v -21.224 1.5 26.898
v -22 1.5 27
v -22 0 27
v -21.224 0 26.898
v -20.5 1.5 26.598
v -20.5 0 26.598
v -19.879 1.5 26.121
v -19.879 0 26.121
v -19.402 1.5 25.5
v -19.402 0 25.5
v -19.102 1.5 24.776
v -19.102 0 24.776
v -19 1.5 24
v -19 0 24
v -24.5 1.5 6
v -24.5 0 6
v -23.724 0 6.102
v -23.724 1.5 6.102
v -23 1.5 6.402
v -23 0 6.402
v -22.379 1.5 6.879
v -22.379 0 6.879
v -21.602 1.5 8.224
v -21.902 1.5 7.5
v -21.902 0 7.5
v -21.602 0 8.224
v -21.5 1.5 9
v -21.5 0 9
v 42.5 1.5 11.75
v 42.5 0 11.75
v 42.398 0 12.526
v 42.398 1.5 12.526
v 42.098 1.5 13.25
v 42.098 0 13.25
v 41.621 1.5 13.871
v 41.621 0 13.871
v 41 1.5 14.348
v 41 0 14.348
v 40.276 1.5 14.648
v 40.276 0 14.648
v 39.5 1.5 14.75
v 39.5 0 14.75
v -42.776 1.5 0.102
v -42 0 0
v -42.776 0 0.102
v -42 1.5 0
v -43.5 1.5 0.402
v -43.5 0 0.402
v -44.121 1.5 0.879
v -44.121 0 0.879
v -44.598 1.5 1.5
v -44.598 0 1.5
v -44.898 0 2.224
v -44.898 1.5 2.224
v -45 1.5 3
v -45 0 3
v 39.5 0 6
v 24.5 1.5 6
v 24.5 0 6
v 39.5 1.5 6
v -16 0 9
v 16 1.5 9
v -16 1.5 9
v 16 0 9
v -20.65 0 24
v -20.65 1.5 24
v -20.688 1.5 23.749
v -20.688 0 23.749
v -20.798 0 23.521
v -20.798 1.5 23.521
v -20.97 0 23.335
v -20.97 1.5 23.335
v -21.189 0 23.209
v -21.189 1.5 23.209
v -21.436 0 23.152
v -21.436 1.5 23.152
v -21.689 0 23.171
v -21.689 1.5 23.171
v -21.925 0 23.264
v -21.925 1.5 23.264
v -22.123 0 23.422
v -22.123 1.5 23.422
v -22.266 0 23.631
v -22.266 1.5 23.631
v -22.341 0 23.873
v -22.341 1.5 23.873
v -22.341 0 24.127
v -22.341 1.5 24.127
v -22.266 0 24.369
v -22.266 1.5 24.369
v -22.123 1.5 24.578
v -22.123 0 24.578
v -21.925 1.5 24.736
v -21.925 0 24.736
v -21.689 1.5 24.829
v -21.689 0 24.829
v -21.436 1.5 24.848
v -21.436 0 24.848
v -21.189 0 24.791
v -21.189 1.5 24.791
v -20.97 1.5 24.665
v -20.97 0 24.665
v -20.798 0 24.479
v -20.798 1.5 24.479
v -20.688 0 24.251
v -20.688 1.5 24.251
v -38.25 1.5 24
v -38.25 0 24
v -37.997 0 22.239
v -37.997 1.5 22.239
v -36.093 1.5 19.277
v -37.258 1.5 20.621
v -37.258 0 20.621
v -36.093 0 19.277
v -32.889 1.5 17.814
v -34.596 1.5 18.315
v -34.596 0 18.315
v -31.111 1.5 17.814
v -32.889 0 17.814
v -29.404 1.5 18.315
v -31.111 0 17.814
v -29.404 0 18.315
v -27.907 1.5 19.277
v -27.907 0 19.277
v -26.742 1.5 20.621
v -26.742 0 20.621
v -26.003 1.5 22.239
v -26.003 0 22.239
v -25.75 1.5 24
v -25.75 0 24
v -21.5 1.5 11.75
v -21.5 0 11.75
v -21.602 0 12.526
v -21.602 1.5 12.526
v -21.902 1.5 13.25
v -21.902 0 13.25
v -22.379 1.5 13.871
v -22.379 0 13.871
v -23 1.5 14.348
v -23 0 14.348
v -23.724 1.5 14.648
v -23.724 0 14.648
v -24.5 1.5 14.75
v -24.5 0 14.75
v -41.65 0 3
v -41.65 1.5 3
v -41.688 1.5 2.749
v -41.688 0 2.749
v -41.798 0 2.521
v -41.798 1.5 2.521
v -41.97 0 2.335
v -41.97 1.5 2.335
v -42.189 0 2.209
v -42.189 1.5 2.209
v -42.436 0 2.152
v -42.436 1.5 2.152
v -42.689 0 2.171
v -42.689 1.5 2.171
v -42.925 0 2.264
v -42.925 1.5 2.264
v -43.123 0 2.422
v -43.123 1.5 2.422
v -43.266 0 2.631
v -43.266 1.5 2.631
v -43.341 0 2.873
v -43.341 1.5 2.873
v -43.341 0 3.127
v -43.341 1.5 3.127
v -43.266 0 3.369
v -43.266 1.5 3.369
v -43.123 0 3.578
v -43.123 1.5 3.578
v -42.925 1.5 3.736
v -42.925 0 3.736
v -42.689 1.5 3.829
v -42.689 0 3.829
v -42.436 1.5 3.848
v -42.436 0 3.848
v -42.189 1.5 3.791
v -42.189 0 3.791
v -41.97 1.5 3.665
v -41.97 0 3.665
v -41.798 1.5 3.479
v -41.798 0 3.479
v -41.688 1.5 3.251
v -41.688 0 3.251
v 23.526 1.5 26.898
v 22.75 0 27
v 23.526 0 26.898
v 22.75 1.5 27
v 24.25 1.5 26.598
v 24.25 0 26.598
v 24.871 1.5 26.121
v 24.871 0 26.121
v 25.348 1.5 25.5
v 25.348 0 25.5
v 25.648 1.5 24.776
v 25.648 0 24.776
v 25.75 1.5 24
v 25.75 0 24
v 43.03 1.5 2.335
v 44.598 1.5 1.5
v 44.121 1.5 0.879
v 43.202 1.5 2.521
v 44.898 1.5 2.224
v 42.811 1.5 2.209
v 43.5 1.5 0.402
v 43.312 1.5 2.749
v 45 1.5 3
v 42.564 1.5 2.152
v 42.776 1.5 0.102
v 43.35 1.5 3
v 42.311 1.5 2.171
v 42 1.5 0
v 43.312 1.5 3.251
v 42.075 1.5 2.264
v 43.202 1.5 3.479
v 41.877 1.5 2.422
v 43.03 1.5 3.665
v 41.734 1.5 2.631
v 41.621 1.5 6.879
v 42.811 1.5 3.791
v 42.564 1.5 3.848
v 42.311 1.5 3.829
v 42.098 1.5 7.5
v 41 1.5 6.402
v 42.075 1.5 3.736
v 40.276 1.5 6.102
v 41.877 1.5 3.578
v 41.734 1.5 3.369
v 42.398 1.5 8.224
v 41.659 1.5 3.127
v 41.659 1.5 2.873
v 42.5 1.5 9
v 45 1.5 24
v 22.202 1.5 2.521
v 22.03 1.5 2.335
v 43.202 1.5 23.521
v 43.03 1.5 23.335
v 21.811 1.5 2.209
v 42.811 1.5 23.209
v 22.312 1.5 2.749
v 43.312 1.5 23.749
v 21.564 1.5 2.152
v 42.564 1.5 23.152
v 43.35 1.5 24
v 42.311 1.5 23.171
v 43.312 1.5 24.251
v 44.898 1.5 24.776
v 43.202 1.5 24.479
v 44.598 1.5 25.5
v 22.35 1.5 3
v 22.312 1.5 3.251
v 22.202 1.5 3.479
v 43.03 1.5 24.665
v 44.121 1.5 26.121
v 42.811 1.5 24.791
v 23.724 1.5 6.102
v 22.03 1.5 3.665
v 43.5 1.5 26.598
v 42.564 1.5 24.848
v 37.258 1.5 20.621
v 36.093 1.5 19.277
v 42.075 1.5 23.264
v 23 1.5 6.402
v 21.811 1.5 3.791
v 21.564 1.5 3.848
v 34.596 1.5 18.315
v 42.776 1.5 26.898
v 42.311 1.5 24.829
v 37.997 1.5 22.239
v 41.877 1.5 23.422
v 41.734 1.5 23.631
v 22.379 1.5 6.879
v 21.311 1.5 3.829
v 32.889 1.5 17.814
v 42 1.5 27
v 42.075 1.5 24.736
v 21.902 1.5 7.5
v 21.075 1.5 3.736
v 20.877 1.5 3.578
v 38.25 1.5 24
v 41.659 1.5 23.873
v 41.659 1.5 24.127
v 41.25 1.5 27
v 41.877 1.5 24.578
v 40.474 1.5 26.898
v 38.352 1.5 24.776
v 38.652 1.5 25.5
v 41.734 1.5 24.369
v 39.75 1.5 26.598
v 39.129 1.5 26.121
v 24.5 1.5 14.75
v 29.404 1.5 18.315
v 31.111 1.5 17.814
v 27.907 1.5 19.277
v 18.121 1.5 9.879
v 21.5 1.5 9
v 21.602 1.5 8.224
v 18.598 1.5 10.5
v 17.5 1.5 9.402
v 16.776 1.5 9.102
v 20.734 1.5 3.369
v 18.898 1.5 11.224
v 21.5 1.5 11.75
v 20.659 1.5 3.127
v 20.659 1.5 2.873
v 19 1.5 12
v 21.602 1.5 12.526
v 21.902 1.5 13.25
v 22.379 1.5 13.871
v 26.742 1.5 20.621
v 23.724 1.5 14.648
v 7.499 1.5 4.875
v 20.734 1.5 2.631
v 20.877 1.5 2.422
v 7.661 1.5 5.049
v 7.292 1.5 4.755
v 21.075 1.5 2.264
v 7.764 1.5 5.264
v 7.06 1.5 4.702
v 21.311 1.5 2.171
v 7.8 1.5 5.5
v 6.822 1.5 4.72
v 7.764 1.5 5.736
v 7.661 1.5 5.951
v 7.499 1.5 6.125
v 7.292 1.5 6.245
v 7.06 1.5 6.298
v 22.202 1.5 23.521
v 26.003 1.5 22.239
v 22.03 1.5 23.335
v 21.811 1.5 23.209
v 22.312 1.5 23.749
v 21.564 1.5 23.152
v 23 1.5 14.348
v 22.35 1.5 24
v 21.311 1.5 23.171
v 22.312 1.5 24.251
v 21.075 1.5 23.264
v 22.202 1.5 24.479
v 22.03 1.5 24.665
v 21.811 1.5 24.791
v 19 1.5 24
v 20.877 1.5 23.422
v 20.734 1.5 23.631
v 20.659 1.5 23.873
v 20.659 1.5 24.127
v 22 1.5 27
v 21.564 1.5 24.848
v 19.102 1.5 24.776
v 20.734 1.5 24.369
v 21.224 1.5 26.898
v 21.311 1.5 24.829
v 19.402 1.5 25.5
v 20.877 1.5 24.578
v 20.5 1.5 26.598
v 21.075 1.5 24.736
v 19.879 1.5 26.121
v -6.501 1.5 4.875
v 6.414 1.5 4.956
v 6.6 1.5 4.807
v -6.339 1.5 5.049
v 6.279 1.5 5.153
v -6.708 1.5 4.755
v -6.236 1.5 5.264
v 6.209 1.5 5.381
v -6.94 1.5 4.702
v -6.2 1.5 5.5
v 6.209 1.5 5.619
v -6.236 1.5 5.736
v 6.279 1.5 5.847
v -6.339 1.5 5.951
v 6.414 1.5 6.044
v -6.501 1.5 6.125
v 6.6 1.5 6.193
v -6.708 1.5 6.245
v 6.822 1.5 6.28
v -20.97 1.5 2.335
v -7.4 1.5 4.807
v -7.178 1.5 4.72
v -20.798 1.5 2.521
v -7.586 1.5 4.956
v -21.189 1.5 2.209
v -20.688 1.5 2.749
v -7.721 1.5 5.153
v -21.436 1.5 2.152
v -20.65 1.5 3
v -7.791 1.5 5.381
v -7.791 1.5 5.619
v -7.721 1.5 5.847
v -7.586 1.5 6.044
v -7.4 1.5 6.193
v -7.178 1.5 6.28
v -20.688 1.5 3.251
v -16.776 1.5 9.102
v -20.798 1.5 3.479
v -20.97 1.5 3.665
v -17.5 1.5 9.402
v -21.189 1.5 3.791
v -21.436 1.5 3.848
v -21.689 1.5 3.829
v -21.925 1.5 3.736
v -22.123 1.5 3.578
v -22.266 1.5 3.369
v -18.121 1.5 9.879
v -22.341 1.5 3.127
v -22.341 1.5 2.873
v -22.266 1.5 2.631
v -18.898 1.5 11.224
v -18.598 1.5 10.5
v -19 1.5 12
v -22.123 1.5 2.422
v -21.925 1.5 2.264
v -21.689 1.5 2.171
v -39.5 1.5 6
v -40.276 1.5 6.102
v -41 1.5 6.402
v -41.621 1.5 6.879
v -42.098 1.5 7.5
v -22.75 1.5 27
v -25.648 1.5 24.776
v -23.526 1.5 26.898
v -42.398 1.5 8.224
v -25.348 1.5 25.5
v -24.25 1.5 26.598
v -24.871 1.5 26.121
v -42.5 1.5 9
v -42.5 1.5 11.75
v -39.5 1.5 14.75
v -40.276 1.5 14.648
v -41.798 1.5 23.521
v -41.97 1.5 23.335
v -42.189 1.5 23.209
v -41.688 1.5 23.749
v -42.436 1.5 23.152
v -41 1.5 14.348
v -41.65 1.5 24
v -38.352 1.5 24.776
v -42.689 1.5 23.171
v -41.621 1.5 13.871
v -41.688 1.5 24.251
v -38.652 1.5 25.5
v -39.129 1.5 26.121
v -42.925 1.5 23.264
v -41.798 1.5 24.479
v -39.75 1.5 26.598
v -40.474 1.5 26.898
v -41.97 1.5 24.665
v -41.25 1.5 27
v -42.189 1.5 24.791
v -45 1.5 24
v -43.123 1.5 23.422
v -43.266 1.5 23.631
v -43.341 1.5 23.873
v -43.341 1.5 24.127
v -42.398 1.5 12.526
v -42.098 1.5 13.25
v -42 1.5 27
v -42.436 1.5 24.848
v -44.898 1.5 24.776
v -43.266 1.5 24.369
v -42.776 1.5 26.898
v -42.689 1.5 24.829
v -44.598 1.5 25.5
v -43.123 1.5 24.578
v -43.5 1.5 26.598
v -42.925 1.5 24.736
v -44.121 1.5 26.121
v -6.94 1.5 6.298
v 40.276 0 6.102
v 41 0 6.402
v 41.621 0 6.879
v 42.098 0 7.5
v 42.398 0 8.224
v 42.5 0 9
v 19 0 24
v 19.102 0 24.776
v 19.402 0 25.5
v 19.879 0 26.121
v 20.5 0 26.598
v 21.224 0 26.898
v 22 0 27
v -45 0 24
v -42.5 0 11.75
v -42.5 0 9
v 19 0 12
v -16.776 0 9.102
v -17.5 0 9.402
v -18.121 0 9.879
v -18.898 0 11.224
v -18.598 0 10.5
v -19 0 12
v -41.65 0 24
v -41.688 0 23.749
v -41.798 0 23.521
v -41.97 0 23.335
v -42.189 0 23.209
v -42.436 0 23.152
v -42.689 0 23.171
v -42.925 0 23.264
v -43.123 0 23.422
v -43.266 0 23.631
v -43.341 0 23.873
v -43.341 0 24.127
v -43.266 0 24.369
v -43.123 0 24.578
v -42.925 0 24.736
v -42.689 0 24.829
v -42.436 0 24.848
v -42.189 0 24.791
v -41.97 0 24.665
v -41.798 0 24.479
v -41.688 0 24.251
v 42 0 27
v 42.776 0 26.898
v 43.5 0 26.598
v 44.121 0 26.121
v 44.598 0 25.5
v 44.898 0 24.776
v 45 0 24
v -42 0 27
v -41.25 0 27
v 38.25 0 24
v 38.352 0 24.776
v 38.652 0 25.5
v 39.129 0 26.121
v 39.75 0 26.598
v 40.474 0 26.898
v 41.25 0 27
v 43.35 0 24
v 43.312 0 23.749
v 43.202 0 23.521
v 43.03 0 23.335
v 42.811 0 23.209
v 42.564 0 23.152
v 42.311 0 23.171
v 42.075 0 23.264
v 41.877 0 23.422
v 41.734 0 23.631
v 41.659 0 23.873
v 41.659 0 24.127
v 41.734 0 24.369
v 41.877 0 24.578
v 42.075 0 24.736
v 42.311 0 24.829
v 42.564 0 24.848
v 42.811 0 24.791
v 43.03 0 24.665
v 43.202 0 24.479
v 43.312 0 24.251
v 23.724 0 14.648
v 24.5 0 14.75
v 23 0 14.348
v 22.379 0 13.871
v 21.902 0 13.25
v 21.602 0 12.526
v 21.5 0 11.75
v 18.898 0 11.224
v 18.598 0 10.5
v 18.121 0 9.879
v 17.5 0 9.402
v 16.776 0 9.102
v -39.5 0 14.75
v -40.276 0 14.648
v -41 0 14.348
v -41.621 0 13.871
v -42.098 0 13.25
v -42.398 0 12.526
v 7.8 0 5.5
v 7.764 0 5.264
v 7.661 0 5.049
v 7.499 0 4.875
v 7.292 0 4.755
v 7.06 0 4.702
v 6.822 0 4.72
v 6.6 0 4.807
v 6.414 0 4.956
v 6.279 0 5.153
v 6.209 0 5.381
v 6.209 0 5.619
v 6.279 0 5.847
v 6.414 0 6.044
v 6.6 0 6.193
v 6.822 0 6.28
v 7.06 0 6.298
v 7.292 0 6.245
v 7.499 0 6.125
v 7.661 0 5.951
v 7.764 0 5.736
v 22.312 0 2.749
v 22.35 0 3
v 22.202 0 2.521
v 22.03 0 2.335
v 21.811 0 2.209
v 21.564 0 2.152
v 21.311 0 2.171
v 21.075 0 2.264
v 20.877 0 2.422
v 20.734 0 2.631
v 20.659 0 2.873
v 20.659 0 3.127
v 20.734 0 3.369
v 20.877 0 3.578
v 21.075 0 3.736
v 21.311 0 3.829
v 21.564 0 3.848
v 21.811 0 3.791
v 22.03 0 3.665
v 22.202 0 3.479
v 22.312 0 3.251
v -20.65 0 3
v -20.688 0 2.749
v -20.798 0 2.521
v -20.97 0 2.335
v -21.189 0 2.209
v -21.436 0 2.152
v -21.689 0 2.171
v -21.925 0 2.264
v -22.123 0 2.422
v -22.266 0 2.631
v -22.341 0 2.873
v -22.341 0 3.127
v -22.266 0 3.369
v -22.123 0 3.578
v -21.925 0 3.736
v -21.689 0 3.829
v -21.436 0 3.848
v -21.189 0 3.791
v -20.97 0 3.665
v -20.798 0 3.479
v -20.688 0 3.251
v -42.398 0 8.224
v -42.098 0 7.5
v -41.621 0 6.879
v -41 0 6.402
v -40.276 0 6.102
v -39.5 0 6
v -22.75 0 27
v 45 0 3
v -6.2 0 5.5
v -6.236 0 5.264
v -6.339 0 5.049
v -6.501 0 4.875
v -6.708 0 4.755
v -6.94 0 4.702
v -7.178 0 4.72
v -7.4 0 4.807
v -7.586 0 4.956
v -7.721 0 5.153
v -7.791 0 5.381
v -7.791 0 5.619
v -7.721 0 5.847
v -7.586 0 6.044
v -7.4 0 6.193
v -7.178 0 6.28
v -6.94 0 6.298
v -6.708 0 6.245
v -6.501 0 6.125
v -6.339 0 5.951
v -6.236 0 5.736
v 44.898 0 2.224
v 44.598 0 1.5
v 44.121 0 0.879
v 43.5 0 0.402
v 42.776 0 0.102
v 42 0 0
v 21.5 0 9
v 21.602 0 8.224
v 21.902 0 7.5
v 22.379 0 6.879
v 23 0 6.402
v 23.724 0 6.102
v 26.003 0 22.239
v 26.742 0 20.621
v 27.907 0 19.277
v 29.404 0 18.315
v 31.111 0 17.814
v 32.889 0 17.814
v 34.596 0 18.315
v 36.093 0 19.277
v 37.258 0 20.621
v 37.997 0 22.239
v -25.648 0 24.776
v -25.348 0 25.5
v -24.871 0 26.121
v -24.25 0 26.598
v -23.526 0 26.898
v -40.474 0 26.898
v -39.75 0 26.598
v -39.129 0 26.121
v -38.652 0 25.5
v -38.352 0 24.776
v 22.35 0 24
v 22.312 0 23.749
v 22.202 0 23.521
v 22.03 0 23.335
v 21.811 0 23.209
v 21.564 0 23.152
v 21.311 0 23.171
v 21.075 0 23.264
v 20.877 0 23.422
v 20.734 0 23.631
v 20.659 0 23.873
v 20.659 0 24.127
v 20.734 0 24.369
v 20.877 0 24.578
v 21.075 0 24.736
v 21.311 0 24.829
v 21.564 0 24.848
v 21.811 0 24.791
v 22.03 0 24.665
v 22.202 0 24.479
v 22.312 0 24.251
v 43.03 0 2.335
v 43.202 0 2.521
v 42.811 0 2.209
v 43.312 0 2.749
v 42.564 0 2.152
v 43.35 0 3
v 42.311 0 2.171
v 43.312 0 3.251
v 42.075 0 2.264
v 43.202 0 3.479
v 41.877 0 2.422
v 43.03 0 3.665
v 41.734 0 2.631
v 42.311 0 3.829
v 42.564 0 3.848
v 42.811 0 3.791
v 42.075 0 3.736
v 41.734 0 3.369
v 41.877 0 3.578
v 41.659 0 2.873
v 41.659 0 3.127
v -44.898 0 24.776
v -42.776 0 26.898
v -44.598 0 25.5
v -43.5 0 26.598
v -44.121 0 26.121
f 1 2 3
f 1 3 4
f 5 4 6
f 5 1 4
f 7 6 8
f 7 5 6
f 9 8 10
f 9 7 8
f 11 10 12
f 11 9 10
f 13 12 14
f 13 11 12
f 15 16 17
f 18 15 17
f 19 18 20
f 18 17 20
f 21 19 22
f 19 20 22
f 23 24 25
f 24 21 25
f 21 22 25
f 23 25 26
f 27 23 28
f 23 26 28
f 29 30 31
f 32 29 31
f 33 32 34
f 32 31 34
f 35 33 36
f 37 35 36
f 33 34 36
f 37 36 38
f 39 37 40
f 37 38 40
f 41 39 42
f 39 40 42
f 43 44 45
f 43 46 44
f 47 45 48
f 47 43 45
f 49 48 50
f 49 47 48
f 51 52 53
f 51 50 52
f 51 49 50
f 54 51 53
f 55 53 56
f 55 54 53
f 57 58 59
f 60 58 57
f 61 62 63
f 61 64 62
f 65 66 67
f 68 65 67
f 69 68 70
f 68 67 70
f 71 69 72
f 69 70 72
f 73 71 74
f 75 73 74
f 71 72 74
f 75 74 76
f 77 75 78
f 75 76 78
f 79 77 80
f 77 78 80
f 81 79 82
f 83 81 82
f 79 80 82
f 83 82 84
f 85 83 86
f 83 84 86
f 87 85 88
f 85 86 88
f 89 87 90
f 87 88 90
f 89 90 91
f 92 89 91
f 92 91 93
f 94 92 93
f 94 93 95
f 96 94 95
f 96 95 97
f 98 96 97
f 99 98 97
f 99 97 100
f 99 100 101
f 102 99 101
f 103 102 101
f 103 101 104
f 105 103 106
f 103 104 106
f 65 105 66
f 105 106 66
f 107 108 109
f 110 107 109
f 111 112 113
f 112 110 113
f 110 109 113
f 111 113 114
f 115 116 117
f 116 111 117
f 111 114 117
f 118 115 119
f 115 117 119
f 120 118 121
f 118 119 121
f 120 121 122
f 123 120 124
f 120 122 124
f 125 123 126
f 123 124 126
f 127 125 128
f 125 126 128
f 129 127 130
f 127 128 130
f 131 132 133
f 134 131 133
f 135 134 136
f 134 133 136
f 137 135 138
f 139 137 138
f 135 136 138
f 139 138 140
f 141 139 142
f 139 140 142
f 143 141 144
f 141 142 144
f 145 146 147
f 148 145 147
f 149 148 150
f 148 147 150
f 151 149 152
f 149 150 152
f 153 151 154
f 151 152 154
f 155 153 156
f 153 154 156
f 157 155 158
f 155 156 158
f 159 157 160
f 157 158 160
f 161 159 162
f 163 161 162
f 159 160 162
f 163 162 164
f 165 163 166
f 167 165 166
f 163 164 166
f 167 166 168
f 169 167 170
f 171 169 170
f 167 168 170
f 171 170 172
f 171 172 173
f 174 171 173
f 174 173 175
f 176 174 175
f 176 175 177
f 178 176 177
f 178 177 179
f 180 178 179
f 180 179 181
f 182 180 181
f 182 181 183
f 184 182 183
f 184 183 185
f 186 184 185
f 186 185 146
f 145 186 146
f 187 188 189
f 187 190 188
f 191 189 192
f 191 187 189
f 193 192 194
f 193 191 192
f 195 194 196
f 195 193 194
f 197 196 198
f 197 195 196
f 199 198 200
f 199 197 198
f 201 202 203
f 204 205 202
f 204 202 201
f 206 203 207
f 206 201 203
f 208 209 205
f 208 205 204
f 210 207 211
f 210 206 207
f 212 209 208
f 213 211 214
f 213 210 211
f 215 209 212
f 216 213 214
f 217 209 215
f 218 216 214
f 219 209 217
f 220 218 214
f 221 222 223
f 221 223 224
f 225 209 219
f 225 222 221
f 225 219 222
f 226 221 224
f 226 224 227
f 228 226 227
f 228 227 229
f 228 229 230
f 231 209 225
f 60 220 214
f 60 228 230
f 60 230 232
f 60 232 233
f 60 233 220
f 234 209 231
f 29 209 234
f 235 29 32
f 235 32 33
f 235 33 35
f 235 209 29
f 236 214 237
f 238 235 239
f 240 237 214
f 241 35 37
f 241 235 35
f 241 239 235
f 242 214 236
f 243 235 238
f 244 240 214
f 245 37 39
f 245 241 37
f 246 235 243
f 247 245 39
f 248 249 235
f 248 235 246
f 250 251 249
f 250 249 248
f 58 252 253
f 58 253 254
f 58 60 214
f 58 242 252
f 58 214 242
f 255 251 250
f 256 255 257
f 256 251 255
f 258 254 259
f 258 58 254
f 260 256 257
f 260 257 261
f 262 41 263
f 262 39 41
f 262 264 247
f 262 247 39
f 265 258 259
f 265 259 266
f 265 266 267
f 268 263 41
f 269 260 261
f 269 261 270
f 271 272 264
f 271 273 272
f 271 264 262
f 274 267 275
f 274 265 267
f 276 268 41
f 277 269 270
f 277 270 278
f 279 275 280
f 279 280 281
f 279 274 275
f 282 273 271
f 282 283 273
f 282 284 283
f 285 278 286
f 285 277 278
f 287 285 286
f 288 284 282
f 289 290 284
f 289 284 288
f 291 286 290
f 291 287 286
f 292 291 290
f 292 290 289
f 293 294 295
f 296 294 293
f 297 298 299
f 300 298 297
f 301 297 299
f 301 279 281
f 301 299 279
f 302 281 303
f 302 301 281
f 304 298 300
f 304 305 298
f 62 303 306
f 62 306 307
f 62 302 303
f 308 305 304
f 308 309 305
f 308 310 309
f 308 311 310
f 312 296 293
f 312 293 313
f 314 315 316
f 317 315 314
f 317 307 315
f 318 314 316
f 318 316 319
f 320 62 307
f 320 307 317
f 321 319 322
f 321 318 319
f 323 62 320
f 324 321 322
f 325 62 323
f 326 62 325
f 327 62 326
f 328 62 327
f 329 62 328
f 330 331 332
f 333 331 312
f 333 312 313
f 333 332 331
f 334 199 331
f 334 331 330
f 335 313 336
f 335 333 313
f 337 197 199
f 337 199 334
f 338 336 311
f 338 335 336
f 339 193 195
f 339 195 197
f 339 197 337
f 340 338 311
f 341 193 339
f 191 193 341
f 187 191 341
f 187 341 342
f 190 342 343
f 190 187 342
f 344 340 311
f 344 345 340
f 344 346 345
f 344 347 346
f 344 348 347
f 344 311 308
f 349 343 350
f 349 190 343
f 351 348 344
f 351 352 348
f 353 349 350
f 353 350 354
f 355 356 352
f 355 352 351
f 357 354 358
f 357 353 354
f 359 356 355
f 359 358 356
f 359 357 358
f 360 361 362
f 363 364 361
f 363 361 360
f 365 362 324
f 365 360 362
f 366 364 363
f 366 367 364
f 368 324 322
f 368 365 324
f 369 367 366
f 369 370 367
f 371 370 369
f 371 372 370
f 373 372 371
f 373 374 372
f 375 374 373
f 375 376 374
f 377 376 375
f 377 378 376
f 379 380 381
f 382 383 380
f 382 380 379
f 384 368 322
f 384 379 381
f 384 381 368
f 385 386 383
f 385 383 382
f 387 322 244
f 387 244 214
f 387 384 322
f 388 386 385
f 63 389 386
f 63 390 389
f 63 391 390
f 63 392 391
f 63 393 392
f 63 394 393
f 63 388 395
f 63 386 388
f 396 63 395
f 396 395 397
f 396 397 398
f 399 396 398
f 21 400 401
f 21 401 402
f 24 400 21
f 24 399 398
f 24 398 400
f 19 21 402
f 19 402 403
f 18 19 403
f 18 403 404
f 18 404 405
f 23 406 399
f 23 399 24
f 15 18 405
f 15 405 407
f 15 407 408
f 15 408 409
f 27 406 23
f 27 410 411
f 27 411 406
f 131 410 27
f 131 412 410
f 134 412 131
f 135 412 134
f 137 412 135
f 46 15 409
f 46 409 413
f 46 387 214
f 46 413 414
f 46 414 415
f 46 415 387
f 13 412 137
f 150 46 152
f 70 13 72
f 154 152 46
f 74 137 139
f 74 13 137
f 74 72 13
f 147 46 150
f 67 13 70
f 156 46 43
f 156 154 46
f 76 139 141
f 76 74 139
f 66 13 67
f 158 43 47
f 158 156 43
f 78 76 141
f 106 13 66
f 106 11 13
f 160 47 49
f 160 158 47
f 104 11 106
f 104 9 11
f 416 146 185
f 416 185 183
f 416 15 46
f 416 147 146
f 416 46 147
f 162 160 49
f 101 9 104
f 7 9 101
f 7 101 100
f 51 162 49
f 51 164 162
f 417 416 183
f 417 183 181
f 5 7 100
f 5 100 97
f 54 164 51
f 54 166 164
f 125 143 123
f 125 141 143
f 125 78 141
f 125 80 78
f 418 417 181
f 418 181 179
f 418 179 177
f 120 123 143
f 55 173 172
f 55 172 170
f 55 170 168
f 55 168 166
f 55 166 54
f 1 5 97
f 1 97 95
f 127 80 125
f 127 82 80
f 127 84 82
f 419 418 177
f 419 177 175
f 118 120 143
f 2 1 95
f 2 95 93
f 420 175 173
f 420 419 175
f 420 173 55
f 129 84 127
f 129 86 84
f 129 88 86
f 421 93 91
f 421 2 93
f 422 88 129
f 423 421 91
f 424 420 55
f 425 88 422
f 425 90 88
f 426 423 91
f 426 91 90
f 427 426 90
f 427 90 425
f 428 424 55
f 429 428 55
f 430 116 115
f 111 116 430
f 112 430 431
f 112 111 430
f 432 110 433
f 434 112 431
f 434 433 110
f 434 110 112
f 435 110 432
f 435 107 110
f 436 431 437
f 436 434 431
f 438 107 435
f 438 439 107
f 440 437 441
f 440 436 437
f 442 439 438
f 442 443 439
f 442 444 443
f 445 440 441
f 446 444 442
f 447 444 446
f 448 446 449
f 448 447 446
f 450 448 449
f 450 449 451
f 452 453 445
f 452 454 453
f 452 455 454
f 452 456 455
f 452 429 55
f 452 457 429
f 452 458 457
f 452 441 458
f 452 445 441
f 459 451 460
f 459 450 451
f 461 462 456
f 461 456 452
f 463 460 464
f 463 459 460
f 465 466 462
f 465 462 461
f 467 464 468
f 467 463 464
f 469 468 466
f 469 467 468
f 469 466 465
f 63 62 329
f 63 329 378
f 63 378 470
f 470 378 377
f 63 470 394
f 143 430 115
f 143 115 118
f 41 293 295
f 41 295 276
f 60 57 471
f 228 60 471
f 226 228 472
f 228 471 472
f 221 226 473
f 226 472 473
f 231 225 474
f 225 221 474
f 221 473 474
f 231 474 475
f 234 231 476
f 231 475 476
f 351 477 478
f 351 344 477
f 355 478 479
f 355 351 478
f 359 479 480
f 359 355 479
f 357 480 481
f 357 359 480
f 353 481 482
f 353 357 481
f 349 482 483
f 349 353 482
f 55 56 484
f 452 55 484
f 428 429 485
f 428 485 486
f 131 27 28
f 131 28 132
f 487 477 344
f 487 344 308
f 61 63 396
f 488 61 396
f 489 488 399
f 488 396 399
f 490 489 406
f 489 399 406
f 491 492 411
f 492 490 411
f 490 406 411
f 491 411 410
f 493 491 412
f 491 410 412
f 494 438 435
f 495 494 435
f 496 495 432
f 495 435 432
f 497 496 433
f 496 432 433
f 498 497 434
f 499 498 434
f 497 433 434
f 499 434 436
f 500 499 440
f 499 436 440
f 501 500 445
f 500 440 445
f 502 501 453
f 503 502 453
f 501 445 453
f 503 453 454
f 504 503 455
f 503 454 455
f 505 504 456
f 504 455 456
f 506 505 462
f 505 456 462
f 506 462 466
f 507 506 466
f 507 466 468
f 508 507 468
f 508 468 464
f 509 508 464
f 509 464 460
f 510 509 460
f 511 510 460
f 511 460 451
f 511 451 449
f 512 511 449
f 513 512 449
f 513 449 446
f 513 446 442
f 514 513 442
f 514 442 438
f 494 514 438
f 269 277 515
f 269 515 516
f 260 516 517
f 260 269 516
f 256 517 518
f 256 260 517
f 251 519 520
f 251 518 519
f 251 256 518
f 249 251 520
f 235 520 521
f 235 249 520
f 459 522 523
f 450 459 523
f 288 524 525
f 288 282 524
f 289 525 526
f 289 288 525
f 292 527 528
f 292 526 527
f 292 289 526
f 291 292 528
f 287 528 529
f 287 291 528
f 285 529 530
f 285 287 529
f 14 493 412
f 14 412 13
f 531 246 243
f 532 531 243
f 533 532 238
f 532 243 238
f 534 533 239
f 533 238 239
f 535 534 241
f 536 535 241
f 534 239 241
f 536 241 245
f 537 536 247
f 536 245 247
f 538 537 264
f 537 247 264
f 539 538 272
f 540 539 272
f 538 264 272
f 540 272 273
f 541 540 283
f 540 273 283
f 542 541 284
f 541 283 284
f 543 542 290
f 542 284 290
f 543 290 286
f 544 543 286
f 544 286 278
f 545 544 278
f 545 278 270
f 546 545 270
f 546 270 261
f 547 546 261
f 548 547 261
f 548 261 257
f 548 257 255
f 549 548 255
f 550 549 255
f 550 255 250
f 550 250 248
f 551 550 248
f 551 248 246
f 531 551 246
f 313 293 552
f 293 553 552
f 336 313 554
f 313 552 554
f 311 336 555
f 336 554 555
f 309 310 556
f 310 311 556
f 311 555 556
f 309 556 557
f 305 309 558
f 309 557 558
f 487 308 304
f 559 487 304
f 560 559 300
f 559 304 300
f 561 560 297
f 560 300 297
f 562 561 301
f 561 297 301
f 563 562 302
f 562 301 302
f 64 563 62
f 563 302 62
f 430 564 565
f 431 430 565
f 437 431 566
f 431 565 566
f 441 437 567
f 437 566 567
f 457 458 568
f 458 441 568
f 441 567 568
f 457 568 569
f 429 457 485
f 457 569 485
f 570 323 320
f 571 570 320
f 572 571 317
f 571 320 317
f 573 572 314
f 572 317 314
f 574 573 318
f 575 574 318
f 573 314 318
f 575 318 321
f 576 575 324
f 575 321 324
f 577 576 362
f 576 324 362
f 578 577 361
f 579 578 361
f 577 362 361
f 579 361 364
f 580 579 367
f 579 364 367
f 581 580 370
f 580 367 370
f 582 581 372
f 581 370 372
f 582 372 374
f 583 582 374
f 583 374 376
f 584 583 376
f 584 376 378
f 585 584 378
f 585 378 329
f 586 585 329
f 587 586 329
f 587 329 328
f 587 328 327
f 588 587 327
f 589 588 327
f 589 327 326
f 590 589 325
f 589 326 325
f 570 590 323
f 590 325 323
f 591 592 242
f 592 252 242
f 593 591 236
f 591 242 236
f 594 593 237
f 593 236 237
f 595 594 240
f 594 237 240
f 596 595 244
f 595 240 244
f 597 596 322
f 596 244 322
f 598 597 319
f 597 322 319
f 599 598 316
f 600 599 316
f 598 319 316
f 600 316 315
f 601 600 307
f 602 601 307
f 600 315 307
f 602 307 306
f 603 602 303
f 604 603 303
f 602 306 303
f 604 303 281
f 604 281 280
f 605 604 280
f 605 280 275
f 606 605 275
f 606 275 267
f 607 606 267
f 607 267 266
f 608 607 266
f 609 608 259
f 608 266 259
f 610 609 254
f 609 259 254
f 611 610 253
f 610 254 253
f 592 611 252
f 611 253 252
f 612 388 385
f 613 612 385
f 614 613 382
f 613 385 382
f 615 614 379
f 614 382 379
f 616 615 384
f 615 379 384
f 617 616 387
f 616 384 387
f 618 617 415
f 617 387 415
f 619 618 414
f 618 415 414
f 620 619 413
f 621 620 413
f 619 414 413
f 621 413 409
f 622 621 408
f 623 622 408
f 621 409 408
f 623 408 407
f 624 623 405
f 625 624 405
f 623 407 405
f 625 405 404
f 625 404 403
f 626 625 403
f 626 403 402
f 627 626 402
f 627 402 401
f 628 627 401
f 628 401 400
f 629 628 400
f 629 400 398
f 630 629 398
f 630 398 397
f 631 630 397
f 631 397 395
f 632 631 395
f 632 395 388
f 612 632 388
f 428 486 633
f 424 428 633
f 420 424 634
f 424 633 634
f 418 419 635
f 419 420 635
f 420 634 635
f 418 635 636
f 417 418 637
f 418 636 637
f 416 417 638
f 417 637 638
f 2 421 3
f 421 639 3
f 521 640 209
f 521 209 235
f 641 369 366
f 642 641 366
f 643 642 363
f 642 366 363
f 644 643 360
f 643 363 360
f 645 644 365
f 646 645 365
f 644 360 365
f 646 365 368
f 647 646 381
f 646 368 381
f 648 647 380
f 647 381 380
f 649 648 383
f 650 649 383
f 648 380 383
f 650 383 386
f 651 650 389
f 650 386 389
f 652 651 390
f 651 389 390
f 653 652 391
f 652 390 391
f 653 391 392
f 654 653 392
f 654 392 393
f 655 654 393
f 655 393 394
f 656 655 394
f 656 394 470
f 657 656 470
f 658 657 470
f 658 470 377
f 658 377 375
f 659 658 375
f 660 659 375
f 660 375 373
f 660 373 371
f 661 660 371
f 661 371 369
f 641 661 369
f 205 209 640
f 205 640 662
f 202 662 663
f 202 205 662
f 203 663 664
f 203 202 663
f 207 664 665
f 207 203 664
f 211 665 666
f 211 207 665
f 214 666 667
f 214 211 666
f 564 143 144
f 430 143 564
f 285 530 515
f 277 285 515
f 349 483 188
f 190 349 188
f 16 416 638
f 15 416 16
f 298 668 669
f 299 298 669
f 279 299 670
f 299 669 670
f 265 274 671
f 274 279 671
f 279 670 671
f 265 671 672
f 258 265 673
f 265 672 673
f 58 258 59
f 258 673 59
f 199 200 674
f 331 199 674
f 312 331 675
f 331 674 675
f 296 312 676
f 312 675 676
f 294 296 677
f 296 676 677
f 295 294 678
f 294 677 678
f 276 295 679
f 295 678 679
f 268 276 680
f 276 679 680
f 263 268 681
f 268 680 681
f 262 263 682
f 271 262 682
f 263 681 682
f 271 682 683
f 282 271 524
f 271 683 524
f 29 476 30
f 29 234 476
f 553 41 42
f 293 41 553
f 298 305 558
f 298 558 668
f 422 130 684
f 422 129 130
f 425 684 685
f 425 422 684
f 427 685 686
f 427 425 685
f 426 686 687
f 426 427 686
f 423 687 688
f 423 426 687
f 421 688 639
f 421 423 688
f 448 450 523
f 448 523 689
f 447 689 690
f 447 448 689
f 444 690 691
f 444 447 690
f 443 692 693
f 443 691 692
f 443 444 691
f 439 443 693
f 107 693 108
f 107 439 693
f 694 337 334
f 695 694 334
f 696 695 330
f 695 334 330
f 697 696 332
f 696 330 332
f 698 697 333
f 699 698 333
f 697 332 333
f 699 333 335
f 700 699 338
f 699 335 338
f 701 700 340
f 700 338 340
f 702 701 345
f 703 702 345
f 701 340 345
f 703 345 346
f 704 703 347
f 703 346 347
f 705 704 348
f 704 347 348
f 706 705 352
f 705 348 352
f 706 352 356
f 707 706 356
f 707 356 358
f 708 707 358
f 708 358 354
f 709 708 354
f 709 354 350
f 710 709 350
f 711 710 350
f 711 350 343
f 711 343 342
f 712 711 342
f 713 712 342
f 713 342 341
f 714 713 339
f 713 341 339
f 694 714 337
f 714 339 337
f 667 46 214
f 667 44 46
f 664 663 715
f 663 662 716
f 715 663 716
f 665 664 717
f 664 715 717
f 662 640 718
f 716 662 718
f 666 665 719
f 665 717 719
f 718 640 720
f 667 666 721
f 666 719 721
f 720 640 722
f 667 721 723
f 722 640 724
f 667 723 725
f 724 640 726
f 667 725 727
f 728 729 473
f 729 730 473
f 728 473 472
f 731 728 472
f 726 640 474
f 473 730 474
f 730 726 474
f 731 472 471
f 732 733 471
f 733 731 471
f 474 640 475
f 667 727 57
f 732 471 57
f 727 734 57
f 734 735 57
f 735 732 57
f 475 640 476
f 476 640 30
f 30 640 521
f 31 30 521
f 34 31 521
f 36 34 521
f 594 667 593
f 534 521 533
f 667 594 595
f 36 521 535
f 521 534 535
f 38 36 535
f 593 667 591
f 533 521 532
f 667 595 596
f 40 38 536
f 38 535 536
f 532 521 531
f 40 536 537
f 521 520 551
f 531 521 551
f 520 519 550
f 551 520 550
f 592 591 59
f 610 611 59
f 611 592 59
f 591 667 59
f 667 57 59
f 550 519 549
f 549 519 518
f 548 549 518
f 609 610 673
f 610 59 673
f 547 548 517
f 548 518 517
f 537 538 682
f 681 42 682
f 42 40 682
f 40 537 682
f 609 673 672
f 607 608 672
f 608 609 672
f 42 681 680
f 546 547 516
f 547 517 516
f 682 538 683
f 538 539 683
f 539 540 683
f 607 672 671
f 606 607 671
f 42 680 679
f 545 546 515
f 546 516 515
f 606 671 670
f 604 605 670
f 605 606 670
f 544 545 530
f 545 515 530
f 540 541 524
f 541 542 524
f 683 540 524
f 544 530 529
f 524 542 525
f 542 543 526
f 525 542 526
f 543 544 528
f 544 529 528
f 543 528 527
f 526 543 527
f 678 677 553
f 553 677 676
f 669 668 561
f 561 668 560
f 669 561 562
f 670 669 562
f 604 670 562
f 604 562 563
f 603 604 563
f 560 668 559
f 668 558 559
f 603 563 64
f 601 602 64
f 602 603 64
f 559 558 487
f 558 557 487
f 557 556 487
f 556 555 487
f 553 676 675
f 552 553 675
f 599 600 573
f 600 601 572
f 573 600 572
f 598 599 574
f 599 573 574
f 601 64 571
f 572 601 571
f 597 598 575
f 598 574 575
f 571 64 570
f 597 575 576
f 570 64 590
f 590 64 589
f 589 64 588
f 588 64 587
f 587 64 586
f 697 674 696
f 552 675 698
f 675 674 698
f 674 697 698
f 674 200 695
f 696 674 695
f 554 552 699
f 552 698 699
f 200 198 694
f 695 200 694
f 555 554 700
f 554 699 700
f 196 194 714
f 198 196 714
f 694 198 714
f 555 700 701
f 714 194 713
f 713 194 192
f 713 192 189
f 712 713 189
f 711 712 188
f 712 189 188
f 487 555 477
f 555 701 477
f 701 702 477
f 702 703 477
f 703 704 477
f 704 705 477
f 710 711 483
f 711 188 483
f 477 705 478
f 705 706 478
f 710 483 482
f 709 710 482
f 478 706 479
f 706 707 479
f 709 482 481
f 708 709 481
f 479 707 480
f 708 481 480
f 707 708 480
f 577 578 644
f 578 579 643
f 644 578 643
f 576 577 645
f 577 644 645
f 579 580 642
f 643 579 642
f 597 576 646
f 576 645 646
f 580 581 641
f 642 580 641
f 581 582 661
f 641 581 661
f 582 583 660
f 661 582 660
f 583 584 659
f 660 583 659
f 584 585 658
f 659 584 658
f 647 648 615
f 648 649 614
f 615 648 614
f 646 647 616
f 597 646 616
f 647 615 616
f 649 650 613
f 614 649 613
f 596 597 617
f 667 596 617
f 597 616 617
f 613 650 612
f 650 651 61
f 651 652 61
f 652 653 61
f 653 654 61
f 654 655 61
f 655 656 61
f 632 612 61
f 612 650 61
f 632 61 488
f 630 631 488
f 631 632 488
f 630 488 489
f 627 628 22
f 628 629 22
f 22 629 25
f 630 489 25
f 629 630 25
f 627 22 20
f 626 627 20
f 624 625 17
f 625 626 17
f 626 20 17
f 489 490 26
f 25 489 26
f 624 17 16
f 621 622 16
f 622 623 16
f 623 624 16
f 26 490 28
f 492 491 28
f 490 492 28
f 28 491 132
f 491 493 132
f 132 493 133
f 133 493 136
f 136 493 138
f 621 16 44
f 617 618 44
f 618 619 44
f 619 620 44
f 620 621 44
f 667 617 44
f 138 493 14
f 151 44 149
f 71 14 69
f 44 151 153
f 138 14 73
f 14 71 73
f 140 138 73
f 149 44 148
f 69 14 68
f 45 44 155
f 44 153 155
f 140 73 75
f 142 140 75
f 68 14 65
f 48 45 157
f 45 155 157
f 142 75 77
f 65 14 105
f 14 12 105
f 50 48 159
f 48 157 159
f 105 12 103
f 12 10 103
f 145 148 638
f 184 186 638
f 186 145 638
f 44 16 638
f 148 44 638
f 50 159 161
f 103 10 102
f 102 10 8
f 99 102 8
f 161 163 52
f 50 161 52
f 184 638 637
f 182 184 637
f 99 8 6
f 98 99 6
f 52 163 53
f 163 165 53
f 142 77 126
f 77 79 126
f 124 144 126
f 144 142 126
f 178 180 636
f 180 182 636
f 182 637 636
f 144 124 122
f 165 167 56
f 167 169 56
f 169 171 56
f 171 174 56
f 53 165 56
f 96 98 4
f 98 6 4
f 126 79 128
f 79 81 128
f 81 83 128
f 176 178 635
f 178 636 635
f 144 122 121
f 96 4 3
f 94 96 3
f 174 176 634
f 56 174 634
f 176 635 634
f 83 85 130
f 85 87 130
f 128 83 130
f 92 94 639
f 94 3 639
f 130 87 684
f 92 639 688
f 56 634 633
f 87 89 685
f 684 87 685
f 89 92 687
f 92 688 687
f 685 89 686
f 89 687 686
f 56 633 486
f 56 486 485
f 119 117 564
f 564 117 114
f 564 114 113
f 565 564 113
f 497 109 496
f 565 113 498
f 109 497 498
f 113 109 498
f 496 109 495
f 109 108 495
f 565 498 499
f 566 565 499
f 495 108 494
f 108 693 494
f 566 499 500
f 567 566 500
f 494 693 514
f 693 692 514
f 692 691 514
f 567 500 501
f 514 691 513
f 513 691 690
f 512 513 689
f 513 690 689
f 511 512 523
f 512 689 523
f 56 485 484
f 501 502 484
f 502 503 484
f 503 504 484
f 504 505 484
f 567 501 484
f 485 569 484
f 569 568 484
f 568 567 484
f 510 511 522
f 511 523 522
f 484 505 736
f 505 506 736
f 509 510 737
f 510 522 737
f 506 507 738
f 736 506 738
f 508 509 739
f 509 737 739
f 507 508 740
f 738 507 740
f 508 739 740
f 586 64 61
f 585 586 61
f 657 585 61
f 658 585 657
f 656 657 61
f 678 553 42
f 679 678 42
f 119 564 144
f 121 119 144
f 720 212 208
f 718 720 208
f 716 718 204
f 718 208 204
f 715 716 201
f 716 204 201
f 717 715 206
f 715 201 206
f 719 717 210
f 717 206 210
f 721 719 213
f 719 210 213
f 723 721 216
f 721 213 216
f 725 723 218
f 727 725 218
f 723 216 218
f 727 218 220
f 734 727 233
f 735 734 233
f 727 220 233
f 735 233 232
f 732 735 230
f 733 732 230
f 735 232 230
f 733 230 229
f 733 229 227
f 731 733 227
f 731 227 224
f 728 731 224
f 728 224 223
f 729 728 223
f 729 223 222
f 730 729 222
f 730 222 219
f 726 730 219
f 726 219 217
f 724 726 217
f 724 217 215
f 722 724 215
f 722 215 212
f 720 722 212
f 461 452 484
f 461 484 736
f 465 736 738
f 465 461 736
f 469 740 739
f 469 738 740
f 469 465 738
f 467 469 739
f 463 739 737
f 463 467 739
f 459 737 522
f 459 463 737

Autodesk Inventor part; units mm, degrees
ref_plane "YZ Plane" through (0, 0, 0) normal (1, 0, 0) x (0, 1, 0)
ref_plane "XZ Plane" through (0, 0, 0) normal (0, 1, 0) x (-1, 0, 0)
ref_plane "XY Plane" through (0, 0, 0) normal (0, 0, 1) x (1, 0, 0)
sketch "スケッチ2" plane through (0, 0, 0) normal (0, 1, 0) x (-1, 0, 0)
  line L0 (19, 24) -> (45, 24)
  line L1 (45, 24) -> (45, 0)
  line L2 (45, 0) -> (19, 0)
  line L3 (19, 0) -> (19, 24)
  circle A0 centre (32, 24) radius 6.25
  line L4 (19, 24) -> (45, 24)
  line L5 (45, 24) -> (45, 27)
  line L6 (45, 27) -> (19, 27)
  line L7 (19, 27) -> (19, 24)
  line L8 (-45, 24) -> (-19, 24)
  line L9 (-19, 24) -> (-19, 0)
  line L10 (-19, 0) -> (-45, 0)
  line L11 (-45, 0) -> (-45, 24)
  circle A1 centre (-32, 24) radius 6.25
  line L12 (-45, 24) -> (-19, 24)
  line L13 (-19, 24) -> (-19, 27)
  line L14 (-19, 27) -> (-45, 27)
  line L15 (-45, 27) -> (-45, 24)
  line L16 (0, -6.05) -> (0, 36.3)
  line L17 (64.3086, 0) -> (-70.8513, 0)
  line L18 (-19, 9) -> (19, 9)
  line L19 (19, 9) -> (19, 0)
  line L20 (19, 0) -> (-19, 0)
  line L21 (-19, 0) -> (-19, 9)
  point P0 (0, 0)
  point P1 (-51.5428, 0.5174)
  point P2 (19, 0)
  point P3 (37.4829, 27)
  point P4 (26.5171, 27)
  point P5 (-26.5171, 27)
  point P6 (-37.4829, 27)
  point P7 (-19, 0)
  dimension "d4" = 26
  dimension "d5" = 24
  dimension "d6" = 12.5
  dimension "d7" = 3
  dimension "d8" = 26
  dimension "d9" = 24
  dimension "d10" = 12.5
  dimension "d11" = 3
  dimension "d12" = 64
  dimension "d13" = 9
extrude "プレート2" add sketch "スケッチ2" along normal blind 1.5 contours A0 L6 L5 L0 | L0 L1 L2 L3 A0 | L0 L7 L6 A0 | L17 L16 L18 L3 | L17 L9 L18 L16 | L10 L11 L8 A1 L9 | L8 A1 L14 L13 | L15 L14 A1 L8
sketch "スケッチ3" plane through (0, 1.5, 0) normal (0, 1, 0) x (1, 0, 0)
  line L0 (45, 0) -> (45, -27) projected
  line L1 (19, -27) -> (19, -9) projected
  line L2 (-42.5, -3) -> (-21.5, -3)
  line L3 (-21.5, -3) -> (-21.5, -17.75)
  line L4 (-21.5, -17.75) -> (-42.5, -17.75)
  line L5 (-42.5, -17.75) -> (-42.5, -3)
  line L6 (21.5, -3) -> (42.5, -3)
  line L7 (42.5, -3) -> (42.5, -17.75)
  line L8 (42.5, -17.75) -> (21.5, -17.75)
  line L9 (21.5, -17.75) -> (21.5, -3)
  arc A0 (-26.5171, -27) -> (-37.4829, -27) centre (-32, -24) ccw projected
  line L10 (-42.5, -6) -> (-21.5, -6)
  line L11 (-21.5, -6) -> (-21.5, -14.75)
  line L12 (-21.5, -14.75) -> (-42.5, -14.75)
  line L13 (-42.5, -14.75) -> (-42.5, -6)
  line L14 (21.5, -6) -> (42.5, -6)
  line L15 (42.5, -6) -> (42.5, -14.75)
  line L16 (42.5, -14.75) -> (21.5, -14.75)
  line L17 (21.5, -14.75) -> (21.5, -6)
  circle A1 centre (-42.5, -24) radius 0.85 projected
  circle A2 centre (-42.5, -3) radius 0.85 projected
  circle A3 centre (-21.5, -3) radius 0.85 projected
  circle A4 centre (-21.5, -24) radius 0.85 projected
  circle A5 centre (21.5, -24) radius 0.85 projected
  circle A6 centre (42.5, -24) radius 0.85 projected
  circle A7 centre (42.5, -3) radius 0.85 projected
  circle A8 centre (21.5, -3) radius 0.85 projected
  circle A9 centre (7, -5.5) radius 0.8 projected
  circle A10 centre (-7, -5.5) radius 0.8 projected
  arc A11 (37.4829, -27) -> (26.5171, -27) centre (32, -24) ccw projected
  arc A12 (37.4829, -27) -> (26.5171, -27) centre (32, -24) ccw projected
  line L18 (45, -27) -> (37.4829, -27) projected
  line L19 (-45, 0) -> (45, 0) projected
  line L20 (-45, -27) -> (-45, 0) projected
  line L21 (-37.4829, -27) -> (-45, -27) projected
  arc A13 (-26.5171, -27) -> (-37.4829, -27) centre (-32, -24) ccw projected
  line L22 (-19, -27) -> (-26.5171, -27) projected
  line L23 (-19, -9) -> (-19, -27) projected
  line L24 (19, -9) -> (-19, -9) projected
  line L25 (26.5171, -27) -> (19, -27) projected
  point P0 (0, 0)
  dimension "d20" = 3
  dimension "d21" = 3
extrude "切り取り1" cut sketch "スケッチ3" against normal blind 1.5 contours L16 L9 L14 L7 | L12 L5 L10 L3 | A7 L6 L7 | L7 L6 A7 | A8 L6 L9 | L9 L6 A8 | A3 L2 L3 | L3 L2 A3 | A2 L2 L5 | L5 L2 A2 | A1 | A4 | A5 | A6 | A9 | A10
fillet "フィレット1" radius 3 20 edges at (-21.5, 0.75, 6) (-21.5, 0.75, 14.75) (-42.5, 0.75, 14.75) (-42.5, 0.75, 6) (-37.4829, 0.75, 27) (-45, 0.75, 27) (-26.5171, 0.75, 27) (-19, 0.75, 27) (19, 0.75, 27) (26.5171, 0.75, 27) (37.4829, 0.75, 27) (45, 0.75, 27) (45, 0.75, 0) (-45, 0.75, 0) (-19, 0.75, 9) (19, 0.75, 9) (42.5, 0.75, 14.75) (21.5, 0.75, 14.75) (21.5, 0.75, 6) (42.5, 0.75, 6)
equation "\"d11\" = d7"
equation "\"d18\" = Thickness"
equation "\"d14\" = Thickness"
equation "\"BendRadius\" = Thickness"
equation "\"BendReliefWidth\" = Thickness"
equation "\"BendReliefDepth\" = 0.5 * Thickness"
equation "\"CornerReliefSize\" = 4 * Thickness"
equation "\"MinimumRemnant\" = 2 * Thickness"
equation "\"TransitionRadius\" = BendRadius"
equation "\"JacobiRadiusSize\" = BendRadius"
equation "\"GapSize\" = Thickness"
equation "\"Thickness\" = 1.5"
properties part number "hipjoint_upper"
